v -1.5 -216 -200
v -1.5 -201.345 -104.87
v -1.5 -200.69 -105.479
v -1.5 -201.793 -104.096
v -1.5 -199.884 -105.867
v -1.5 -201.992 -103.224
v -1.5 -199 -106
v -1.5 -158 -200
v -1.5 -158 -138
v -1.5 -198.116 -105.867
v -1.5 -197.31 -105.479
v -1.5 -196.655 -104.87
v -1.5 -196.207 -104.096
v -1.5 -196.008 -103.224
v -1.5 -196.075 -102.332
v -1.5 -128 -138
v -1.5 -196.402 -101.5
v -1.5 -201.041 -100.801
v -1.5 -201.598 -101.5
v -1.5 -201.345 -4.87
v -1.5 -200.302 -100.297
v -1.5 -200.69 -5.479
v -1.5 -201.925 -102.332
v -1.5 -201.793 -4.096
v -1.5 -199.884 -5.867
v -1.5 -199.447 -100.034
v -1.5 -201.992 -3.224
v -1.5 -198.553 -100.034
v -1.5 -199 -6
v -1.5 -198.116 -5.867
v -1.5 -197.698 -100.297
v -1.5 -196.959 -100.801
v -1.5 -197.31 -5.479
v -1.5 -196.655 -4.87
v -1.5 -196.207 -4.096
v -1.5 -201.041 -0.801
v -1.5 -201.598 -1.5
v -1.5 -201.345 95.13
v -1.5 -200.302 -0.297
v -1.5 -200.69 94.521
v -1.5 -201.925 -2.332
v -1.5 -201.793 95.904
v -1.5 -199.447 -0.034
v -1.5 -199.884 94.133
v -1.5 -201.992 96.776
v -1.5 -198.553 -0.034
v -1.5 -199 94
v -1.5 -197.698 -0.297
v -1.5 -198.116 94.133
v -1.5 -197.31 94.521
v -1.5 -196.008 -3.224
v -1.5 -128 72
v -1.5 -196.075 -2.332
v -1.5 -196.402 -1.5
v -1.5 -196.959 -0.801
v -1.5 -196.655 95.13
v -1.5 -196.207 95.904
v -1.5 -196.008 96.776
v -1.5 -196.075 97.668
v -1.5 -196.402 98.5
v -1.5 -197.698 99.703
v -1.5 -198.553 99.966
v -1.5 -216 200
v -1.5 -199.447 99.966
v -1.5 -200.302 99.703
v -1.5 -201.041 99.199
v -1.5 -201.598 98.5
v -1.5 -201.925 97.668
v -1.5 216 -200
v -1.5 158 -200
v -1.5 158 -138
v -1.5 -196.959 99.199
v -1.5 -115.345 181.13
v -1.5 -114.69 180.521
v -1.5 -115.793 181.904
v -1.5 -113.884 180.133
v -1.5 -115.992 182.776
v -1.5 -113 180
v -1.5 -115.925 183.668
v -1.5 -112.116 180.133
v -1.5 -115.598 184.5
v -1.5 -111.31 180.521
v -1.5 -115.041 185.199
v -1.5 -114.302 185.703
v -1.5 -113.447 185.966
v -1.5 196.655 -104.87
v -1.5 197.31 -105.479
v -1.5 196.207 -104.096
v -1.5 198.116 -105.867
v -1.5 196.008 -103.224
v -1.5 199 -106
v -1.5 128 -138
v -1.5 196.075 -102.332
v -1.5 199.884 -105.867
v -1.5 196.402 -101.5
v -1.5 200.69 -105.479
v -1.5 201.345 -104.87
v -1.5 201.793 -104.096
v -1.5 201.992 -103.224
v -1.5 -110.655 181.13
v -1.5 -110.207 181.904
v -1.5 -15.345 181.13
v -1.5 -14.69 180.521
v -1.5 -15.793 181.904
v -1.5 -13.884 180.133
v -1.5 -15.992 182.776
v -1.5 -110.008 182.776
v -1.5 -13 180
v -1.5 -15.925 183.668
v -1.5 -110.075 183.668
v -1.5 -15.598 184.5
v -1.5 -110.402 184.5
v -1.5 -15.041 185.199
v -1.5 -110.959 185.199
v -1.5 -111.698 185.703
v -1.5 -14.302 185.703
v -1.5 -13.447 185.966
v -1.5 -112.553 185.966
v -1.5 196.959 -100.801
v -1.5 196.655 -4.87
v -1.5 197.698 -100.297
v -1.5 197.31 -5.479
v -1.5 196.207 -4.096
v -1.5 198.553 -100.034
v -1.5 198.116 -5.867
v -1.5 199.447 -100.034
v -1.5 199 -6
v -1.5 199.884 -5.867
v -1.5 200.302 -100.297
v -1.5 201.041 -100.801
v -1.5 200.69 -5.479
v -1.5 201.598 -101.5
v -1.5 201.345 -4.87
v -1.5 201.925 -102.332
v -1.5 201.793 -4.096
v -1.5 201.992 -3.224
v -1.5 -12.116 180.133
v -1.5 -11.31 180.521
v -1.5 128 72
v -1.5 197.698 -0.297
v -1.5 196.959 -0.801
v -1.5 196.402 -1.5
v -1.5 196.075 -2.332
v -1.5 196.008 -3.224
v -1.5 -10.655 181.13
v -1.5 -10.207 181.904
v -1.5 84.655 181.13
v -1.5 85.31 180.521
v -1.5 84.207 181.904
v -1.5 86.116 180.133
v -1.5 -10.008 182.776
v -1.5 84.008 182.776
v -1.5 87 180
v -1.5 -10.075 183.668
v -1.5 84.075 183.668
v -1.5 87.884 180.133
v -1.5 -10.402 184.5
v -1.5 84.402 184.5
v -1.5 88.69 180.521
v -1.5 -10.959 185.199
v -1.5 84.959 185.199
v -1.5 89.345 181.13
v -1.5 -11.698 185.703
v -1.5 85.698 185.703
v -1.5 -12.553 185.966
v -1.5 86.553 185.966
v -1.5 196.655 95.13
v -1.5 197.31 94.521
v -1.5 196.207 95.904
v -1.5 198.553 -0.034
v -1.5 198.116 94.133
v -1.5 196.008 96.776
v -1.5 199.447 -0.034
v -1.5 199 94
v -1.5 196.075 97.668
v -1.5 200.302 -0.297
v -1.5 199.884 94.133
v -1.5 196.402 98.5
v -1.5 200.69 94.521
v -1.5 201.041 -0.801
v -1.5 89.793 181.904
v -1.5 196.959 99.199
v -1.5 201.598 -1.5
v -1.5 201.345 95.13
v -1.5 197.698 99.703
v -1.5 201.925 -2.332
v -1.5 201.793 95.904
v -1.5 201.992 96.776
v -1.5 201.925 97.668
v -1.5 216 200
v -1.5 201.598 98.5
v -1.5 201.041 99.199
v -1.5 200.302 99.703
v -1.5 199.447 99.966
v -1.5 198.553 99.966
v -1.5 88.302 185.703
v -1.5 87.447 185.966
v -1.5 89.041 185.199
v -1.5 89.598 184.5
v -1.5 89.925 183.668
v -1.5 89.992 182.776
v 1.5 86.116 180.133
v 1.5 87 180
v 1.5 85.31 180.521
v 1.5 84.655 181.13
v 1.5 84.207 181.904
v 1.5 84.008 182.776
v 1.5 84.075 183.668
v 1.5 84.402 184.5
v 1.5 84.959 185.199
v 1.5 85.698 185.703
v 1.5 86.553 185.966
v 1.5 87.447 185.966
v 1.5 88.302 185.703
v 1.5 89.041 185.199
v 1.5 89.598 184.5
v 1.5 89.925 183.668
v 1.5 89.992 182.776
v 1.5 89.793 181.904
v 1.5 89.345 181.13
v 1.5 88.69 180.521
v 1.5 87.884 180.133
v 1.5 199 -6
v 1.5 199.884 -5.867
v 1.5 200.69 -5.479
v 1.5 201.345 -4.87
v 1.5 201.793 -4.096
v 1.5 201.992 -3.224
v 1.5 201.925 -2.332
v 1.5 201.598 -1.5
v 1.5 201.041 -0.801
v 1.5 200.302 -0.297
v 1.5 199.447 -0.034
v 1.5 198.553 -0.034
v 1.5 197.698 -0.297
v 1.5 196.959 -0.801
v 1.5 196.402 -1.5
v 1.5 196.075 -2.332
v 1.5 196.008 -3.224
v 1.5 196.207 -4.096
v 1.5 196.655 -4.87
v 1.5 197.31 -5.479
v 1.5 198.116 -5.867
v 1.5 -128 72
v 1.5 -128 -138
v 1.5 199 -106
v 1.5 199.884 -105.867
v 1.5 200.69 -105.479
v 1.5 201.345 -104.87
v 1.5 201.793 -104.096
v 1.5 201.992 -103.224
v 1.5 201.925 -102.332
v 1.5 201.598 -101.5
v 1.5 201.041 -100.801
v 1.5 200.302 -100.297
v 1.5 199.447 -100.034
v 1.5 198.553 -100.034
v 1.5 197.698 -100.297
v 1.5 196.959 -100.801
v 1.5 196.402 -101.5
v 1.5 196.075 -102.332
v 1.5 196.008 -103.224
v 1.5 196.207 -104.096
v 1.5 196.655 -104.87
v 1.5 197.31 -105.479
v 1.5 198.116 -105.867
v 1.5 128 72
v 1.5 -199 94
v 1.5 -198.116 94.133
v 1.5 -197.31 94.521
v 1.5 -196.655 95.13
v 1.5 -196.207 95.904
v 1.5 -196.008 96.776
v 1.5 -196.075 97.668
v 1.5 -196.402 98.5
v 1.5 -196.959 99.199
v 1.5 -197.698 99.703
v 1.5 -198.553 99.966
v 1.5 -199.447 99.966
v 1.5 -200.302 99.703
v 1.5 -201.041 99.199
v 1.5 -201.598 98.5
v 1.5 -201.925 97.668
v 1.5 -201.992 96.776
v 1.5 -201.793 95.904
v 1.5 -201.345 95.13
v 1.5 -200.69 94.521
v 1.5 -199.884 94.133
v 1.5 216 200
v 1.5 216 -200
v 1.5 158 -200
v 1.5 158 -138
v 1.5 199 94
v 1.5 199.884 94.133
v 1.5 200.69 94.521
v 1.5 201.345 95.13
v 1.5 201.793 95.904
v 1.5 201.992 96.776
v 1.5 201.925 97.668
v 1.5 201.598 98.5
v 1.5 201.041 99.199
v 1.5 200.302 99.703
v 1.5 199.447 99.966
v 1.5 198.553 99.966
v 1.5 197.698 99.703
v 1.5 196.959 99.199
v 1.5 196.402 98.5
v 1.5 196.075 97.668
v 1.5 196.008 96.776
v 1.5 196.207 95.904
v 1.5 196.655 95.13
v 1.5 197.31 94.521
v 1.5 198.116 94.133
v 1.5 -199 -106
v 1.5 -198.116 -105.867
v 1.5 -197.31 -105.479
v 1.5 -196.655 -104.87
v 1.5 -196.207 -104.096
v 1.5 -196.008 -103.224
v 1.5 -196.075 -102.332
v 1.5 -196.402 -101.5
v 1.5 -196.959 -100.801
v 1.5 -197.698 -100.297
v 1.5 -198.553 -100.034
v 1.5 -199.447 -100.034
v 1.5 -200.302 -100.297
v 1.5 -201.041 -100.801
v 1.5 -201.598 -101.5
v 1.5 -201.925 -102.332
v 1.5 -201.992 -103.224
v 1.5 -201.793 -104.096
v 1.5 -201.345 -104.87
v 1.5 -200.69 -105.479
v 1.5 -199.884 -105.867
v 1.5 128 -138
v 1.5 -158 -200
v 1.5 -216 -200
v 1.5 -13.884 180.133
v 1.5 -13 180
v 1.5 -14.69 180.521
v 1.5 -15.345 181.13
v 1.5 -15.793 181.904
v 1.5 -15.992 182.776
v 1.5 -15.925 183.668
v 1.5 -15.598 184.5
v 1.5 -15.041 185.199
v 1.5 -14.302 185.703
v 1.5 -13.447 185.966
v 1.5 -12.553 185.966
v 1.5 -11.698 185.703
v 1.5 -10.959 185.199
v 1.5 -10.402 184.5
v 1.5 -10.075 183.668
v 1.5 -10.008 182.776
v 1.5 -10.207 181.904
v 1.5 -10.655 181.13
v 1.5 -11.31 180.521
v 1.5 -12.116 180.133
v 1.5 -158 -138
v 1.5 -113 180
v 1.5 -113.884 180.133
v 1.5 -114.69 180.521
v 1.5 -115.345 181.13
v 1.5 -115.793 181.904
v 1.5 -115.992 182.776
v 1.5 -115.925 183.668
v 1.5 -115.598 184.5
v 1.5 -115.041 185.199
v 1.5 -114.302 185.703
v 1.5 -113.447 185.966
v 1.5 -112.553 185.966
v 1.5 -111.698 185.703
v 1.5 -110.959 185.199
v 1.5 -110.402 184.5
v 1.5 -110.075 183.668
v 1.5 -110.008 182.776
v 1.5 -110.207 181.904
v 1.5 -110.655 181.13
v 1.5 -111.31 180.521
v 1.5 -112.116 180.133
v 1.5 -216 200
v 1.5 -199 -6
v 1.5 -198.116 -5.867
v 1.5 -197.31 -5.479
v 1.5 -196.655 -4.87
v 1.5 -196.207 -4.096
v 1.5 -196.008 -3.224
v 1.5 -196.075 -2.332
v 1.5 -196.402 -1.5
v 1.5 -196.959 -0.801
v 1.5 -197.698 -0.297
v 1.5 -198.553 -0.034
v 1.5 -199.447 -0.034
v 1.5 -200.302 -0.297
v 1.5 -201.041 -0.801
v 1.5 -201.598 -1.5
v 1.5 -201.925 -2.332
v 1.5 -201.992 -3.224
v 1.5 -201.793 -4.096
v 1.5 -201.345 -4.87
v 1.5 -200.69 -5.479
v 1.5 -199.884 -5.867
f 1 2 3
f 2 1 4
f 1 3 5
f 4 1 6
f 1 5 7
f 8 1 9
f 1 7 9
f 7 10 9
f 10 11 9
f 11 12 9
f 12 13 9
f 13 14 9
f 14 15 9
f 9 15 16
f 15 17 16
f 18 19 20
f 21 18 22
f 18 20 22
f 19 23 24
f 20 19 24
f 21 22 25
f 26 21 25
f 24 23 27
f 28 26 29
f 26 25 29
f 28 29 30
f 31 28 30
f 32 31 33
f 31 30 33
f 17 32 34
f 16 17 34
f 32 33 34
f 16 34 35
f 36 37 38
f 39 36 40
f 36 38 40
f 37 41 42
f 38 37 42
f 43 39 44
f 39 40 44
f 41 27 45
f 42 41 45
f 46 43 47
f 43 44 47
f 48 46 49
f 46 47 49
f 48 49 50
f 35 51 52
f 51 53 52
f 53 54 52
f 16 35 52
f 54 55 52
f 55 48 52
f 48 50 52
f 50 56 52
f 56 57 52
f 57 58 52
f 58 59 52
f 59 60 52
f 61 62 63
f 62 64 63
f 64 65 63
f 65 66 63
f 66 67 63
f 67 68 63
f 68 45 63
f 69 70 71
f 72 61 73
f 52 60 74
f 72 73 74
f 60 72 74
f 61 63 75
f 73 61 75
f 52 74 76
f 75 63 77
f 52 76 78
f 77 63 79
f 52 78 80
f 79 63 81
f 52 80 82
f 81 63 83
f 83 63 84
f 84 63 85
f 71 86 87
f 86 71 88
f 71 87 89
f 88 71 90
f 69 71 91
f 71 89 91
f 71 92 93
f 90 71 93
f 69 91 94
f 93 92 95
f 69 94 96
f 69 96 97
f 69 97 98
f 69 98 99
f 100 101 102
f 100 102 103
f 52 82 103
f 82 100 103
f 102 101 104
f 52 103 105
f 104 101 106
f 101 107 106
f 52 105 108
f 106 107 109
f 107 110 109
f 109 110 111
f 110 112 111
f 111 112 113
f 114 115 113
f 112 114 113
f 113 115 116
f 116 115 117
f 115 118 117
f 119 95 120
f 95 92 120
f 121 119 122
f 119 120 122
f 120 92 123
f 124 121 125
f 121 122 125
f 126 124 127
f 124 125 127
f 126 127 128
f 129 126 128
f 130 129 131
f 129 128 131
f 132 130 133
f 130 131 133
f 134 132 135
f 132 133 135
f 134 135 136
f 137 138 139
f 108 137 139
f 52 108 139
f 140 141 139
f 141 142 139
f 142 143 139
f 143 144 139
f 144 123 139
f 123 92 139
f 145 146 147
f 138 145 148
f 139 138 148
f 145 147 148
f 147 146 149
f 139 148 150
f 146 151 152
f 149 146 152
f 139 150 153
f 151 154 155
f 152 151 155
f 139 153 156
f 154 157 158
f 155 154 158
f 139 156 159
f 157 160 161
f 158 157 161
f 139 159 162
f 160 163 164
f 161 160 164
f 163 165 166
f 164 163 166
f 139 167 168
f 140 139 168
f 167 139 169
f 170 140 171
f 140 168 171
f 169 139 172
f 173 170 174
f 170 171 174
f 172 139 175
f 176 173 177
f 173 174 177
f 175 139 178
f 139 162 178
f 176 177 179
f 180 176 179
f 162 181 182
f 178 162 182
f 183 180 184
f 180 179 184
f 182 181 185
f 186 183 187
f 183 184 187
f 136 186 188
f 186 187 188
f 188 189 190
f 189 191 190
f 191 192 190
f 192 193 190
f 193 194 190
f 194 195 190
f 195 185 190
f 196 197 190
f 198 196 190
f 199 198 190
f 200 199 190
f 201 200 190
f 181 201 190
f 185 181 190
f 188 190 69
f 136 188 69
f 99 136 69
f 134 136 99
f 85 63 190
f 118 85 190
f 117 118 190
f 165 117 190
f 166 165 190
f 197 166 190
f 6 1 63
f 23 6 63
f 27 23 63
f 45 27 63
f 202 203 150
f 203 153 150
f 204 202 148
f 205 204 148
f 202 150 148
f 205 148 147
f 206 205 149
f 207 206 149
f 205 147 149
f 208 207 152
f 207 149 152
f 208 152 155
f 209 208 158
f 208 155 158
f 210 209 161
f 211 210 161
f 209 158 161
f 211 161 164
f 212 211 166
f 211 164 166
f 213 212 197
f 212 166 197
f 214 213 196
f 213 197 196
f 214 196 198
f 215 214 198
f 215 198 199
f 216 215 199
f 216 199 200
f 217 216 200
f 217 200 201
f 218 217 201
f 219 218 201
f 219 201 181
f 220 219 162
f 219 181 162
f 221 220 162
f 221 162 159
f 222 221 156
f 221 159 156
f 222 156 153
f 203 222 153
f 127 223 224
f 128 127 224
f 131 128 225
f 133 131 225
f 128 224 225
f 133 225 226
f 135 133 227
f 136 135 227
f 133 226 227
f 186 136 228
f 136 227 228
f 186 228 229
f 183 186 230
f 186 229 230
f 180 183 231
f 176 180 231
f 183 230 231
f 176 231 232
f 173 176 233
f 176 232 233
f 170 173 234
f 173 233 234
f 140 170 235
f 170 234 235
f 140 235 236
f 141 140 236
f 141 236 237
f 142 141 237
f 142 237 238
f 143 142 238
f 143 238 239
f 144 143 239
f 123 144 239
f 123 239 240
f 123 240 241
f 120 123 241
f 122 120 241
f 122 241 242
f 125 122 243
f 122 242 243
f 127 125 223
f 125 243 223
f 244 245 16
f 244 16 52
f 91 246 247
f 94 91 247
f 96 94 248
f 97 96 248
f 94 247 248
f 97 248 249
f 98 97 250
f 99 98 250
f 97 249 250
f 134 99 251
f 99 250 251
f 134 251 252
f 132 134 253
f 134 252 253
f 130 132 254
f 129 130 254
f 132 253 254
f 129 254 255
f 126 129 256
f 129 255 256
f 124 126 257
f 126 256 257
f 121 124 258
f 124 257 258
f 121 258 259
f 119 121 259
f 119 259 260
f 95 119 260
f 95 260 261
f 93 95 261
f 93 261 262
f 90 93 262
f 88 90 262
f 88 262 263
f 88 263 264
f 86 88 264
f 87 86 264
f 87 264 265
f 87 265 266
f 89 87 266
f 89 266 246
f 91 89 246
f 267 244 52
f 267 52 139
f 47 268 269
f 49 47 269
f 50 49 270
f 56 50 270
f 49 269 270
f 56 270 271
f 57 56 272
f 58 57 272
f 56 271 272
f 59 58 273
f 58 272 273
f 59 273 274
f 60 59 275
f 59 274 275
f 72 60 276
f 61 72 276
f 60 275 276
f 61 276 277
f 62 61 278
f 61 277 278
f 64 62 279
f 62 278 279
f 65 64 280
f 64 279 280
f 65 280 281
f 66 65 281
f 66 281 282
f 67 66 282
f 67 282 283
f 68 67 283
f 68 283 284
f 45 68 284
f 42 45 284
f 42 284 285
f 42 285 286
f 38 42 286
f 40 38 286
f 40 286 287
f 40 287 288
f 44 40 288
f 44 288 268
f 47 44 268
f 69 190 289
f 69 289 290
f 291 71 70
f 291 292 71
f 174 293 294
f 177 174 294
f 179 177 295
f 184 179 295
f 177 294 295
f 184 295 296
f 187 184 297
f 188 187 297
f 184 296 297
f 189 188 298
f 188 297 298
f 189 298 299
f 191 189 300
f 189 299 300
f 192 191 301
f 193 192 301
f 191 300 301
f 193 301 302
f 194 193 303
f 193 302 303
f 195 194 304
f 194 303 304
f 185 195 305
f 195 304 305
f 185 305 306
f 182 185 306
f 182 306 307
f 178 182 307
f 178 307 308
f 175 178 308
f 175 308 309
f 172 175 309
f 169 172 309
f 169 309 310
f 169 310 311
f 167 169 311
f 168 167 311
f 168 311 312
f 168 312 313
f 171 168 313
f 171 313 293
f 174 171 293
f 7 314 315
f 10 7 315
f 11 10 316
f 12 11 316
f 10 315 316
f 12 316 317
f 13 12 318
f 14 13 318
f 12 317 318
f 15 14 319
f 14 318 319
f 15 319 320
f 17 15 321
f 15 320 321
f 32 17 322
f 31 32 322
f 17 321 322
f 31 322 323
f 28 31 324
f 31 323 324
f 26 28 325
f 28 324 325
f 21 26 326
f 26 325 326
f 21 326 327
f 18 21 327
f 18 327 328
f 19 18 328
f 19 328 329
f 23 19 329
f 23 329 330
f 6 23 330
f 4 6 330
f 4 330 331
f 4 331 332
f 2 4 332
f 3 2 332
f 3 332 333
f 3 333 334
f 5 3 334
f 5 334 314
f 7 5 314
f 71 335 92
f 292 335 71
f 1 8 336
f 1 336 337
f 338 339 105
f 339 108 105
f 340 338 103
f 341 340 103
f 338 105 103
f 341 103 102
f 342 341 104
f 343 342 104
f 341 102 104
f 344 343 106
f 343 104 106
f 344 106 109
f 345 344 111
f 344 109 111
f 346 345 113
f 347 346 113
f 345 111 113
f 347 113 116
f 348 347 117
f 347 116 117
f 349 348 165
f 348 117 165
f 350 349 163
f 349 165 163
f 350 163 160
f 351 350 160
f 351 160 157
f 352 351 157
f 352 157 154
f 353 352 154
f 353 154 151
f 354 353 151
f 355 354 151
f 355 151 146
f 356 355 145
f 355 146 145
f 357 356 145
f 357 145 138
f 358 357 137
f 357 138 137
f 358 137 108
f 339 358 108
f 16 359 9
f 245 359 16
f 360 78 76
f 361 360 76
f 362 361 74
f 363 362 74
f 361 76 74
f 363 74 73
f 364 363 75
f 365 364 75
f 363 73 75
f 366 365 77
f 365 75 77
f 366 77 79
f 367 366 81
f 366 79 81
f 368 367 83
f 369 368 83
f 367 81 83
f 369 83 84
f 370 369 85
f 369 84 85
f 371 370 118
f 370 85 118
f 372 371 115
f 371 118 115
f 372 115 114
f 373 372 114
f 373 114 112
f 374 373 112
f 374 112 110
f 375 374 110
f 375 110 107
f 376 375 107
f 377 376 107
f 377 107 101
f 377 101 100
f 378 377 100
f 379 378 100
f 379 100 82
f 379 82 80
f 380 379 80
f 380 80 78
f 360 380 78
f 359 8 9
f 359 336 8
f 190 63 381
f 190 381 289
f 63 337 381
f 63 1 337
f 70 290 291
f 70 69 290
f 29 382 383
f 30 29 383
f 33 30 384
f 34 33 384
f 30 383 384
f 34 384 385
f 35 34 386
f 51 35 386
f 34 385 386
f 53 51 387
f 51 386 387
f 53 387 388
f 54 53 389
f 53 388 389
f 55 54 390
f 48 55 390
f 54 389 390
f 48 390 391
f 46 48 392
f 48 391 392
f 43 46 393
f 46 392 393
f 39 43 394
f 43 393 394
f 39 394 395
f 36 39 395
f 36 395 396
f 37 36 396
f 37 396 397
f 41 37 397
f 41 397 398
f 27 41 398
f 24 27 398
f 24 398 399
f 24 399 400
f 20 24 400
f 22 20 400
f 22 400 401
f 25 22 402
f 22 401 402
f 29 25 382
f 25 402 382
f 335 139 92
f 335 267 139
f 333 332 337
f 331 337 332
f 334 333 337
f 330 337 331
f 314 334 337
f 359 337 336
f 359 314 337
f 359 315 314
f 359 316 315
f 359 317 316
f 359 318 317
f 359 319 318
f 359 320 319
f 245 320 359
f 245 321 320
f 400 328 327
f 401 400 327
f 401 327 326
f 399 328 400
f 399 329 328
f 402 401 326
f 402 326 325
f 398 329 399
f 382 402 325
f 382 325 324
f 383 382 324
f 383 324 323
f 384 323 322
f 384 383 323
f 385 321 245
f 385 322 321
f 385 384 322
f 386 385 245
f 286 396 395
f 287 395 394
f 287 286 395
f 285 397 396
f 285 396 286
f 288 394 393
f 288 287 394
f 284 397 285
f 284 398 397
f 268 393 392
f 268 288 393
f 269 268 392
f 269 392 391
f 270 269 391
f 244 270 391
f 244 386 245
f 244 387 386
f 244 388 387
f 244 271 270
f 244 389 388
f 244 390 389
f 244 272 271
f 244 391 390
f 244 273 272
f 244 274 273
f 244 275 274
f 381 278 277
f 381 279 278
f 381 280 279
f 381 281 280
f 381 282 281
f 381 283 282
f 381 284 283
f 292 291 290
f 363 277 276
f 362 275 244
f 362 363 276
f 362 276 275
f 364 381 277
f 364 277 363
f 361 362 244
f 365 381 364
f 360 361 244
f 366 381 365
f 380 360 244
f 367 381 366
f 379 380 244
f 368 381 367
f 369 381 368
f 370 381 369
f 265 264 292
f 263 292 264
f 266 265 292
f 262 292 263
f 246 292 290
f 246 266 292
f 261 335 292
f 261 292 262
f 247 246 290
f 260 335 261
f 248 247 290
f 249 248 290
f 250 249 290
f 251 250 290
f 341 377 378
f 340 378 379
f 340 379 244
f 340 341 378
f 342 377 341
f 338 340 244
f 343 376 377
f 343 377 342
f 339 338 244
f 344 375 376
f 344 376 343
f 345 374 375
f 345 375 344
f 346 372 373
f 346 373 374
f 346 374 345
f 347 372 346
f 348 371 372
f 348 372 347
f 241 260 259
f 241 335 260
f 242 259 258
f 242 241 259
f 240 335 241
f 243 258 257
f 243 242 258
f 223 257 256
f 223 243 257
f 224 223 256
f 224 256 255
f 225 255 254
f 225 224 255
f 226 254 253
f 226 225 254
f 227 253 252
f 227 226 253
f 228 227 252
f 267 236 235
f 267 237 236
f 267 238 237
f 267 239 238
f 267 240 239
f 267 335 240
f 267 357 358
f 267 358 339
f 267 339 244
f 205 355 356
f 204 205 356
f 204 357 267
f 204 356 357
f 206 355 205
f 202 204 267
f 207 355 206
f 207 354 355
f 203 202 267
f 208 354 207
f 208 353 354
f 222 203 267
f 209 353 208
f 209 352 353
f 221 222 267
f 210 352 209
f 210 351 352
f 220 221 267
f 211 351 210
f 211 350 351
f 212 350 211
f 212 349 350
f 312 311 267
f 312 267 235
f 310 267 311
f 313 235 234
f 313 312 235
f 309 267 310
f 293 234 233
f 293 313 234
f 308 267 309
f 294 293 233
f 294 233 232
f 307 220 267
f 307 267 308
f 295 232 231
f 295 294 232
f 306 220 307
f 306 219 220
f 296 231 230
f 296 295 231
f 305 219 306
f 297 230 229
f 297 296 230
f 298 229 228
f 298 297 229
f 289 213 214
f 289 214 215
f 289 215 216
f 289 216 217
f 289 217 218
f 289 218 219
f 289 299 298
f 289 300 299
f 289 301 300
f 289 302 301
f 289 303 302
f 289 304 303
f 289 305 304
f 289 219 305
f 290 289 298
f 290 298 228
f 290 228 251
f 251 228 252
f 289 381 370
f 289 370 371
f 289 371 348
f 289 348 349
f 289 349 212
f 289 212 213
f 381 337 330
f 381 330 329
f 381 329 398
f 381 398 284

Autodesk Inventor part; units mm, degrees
ref_plane "YZ Plane" through (0, 0, 0) normal (1, 0, 0) x (0, 1, 0)
ref_plane "XZ Plane" through (0, 0, 0) normal (0, 1, 0) x (-1, 0, 0)
ref_plane "XY Plane" through (0, 0, 0) normal (0, 0, 1) x (1, 0, 0)
sketch "Sketch1" plane through (0, 0, 0) normal (1, 0, 0) x (0, 1, 0)
  line L0 (-216, 200) -> (216, 200)
  line L1 (216, 200) -> (216, -200)
  line L2 (216, -200) -> (-216, -200)
  line L3 (-216, -200) -> (-216, 200)
  line L4 (-216, 200) -> (216, -200) construction
  line L5 (216, 200) -> (-216, -200) construction
  point P0 (0, 0)
  dimension "d0" = 432
  dimension "d1" = 400
extrude "Extrusion1" add sketch "Sketch1" along normal mid plane 3
sketch "Sketch2" plane through (1.5, 0, 0) normal (1, 0, 0) x (0, 0, -1)
  line L0 (200, -216) -> (200, 216) projected
  line L1 (200, -158) -> (138, -158)
  line L2 (138, -158) -> (138, -128)
  line L3 (138, -128) -> (-72, -128)
  line L4 (-72, -128) -> (-72, 128)
  line L5 (-72, 128) -> (138, 128)
  line L6 (138, 128) -> (138, 158)
  line L7 (138, 158) -> (200, 158)
  line L8 (-200, -216) -> (200, -216) projected
  line L9 (200, 216) -> (-200, 216) projected
  point P0 (0, 0)
  dimension "d4" = 58
  dimension "d5" = 58
  dimension "d6" = 62
  dimension "d7" = 30
  dimension "d8" = 210
extrude "Extrusion2" cut sketch "Sketch2" against normal blind 3
sketch "Sketch3" plane through (1.5, 0, 0) normal (1, 0, 0) x (0, 0, -1)
  circle A0 centre (3, 199) radius 3
  circle A1 centre (103, 199) radius 3
  circle A2 centre (-97, 199) radius 3
  circle A3 centre (-97, -199) radius 3
  circle A4 centre (3, -199) radius 3
  circle A5 centre (103, -199) radius 3
  line L0 (-200, 216) -> (-200, -216) projected
  line L1 (200, 216) -> (-200, 216) projected
  line L2 (-200, -216) -> (200, -216) projected
  point P0 (0, 0)
  dimension "d13" = 103
  dimension "d14" = 17
  dimension "d15" = 6
  dimension "d16" = 100
  dimension "d17" = 100
  dimension "d18" = 17
  dimension "d19" = 100
extrude "Extrusion3" cut sketch "Sketch3" against normal blind 3
sketch "Sketch4" plane through (1.5, 0, 0) normal (1, 0, 0) x (0, 0, -1)
  circle A0 centre (-183, -113) radius 2.5 projected
  circle A1 centre (-183, -13) radius 2.5 projected
  arc A2 (-183, 79.5) -> (-183, 94.5) centre (-183, 87) ccw projected
  line L0 (-183, 94.5) -> (-194, 94.5) projected
  line L1 (-194, 79.5) -> (-194, 94.5) projected
  line L2 (-183, 79.5) -> (-194, 79.5) projected
  circle A3 centre (-183, 87) radius 2.5 projected
  point P0 (0, 0)
hole "Hole1" at (1.5, -113, 183) at (1.5, -13, 183) at (1.5, 87, 183) direction (-1, 0, 0) diameter 6 depth 14.2 tip angle 118
equation "\"d5\" = d4"
properties part number "HCMUTE-CDT23-KXL_A04" material "PMMA Plastic"
